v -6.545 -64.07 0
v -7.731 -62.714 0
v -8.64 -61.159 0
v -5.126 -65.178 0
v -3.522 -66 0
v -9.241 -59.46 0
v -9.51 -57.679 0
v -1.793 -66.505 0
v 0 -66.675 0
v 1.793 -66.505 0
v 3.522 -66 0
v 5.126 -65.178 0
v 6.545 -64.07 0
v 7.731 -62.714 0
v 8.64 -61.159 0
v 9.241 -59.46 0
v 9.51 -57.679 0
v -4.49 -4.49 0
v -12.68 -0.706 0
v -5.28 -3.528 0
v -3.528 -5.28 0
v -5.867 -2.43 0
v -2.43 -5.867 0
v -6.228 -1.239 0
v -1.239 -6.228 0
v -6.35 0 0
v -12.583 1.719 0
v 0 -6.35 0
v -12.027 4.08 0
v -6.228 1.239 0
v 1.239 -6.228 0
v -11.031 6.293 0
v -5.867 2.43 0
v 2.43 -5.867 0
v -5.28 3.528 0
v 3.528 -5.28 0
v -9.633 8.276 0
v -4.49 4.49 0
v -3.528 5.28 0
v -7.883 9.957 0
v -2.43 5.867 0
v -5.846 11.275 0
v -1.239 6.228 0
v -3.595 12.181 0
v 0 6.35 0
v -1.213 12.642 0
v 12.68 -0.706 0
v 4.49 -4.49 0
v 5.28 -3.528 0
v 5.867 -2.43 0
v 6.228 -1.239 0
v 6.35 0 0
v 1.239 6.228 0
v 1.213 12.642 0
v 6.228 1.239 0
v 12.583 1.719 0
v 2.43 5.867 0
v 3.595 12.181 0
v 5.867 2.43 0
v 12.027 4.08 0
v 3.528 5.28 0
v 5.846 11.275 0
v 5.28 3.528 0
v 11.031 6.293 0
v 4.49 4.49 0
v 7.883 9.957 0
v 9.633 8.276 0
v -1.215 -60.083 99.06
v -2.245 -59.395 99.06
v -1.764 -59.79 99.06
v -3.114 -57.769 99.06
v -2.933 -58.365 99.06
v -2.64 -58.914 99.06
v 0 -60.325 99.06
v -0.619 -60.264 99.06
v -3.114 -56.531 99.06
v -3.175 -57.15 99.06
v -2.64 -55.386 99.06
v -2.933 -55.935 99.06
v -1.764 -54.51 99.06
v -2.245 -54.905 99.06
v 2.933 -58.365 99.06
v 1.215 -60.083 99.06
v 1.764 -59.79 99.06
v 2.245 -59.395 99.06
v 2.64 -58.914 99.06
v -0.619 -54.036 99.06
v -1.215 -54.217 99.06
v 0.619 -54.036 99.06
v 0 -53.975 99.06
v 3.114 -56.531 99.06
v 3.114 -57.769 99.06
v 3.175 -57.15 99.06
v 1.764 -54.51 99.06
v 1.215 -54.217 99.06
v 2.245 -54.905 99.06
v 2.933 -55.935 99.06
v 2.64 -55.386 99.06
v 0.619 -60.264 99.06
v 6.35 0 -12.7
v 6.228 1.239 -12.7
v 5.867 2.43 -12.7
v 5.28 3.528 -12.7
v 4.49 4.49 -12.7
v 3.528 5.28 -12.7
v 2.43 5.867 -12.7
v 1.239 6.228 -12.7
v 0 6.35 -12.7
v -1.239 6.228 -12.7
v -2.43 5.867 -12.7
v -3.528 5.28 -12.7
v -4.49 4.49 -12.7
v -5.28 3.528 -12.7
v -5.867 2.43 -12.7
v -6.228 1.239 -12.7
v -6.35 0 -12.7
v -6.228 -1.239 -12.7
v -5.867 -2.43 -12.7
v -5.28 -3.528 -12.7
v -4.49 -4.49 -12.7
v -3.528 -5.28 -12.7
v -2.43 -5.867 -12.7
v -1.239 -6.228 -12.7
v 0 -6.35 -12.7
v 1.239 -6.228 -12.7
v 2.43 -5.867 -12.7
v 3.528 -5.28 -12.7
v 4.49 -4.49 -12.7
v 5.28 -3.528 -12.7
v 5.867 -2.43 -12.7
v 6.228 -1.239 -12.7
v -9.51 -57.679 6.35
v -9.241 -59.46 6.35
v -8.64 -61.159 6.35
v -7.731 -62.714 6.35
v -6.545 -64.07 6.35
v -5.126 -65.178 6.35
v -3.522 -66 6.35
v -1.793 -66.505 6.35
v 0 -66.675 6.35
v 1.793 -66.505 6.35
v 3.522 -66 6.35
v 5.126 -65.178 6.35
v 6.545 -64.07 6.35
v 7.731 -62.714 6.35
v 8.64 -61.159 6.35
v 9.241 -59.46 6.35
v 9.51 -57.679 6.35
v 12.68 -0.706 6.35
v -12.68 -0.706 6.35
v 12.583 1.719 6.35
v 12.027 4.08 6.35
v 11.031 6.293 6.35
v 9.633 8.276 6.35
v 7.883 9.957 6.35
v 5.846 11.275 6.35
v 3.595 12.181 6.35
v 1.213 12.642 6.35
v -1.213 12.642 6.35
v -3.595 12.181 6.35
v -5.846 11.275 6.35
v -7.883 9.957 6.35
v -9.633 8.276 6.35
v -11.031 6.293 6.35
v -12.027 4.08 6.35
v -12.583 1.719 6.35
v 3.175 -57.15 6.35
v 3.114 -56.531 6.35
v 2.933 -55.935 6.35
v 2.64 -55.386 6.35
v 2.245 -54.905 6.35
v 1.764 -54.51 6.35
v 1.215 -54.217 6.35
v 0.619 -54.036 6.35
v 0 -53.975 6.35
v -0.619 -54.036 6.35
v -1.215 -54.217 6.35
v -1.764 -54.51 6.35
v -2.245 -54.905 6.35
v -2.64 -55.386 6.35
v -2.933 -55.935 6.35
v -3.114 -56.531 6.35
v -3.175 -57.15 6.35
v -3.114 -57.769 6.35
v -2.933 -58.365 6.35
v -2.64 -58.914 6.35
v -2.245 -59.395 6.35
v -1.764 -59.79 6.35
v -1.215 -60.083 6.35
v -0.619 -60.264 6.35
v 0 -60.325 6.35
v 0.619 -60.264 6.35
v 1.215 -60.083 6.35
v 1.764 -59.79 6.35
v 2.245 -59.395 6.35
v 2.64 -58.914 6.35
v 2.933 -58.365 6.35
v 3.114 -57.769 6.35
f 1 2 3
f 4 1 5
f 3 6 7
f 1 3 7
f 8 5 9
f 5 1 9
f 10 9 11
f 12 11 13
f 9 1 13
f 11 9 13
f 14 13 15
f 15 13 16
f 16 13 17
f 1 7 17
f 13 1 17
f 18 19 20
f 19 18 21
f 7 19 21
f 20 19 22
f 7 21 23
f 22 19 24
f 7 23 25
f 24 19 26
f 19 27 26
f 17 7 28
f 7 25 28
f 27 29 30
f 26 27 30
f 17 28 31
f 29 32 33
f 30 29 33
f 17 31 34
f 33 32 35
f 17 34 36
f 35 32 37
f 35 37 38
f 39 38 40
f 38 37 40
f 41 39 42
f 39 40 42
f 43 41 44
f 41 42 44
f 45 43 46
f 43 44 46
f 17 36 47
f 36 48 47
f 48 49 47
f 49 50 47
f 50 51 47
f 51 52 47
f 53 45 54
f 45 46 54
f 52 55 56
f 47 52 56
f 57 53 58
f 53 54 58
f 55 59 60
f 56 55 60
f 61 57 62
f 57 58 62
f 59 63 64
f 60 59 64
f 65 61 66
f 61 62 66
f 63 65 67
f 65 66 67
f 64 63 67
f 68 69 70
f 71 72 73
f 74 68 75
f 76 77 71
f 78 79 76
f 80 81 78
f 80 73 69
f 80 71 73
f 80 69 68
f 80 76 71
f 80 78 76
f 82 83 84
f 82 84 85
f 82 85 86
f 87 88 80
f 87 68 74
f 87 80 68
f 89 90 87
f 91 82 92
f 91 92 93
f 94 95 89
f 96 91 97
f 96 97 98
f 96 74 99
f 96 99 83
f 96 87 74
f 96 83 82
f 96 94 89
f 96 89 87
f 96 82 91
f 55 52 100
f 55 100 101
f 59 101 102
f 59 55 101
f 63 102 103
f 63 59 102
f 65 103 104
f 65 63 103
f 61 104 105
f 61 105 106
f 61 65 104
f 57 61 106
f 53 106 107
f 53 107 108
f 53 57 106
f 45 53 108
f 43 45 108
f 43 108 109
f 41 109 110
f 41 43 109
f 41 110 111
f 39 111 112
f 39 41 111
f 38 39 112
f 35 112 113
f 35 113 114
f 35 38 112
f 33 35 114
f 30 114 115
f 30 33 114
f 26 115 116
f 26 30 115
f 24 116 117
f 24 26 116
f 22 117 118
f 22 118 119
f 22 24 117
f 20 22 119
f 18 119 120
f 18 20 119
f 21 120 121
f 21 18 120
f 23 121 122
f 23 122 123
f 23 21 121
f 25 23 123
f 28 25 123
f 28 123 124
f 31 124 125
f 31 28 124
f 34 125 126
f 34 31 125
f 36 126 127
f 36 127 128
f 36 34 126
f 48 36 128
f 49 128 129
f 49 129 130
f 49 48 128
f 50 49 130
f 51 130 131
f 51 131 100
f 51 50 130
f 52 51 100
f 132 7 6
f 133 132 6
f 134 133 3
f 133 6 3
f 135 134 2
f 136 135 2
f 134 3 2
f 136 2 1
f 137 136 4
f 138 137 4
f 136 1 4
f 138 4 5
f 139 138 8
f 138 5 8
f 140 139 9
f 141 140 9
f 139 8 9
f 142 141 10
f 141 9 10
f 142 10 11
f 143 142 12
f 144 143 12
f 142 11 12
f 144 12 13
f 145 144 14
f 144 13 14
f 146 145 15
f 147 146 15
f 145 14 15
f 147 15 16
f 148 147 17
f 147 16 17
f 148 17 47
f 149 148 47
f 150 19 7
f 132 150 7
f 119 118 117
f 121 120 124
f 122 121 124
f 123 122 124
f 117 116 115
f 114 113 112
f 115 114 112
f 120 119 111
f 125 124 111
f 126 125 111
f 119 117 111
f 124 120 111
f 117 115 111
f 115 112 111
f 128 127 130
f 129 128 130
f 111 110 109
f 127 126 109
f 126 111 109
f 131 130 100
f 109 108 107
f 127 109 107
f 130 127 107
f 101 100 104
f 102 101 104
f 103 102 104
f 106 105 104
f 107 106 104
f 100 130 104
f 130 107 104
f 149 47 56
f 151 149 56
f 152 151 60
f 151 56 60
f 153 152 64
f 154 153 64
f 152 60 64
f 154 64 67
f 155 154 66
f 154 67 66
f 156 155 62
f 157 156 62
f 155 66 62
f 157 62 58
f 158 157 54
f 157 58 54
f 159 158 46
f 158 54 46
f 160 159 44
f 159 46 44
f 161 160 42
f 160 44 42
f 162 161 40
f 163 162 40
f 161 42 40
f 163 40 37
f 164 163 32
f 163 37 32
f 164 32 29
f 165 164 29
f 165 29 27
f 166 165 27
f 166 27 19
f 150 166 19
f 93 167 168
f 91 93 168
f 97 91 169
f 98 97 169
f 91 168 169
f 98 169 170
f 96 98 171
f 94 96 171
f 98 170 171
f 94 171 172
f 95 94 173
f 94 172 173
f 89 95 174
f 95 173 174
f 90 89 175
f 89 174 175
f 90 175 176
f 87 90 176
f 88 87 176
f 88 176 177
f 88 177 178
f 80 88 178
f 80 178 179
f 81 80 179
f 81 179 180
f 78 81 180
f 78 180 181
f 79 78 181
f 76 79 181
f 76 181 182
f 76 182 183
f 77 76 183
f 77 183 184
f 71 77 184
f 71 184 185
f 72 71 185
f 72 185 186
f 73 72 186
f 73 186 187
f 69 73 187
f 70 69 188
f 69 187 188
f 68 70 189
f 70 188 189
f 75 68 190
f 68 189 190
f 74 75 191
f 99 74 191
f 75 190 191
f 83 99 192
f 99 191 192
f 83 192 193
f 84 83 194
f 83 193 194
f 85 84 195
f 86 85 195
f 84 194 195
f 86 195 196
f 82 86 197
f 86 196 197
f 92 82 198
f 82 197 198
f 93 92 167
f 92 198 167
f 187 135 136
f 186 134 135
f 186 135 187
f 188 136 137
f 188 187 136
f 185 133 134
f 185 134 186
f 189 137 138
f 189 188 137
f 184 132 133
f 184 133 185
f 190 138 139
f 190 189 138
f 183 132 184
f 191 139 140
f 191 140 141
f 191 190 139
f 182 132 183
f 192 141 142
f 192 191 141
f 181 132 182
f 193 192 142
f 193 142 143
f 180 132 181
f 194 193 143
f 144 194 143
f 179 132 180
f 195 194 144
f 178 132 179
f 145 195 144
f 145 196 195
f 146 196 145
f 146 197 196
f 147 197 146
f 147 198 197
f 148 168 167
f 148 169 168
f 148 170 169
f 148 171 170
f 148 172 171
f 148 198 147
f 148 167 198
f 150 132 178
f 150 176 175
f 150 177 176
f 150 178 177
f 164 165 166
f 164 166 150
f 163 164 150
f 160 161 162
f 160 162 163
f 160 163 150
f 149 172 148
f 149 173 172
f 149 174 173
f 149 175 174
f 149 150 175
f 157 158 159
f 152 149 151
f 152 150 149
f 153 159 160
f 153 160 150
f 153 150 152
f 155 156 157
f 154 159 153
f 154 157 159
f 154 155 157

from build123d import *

# Parameters (mm, degrees)
SKETCH1_R           = 6.35
BOSS_EXTRUDE1_DEPTH = 12.7
SKETCH1_3_R         = 3.175
BOSS_EXTRUDE2_DEPTH = 6.35
SKETCH1_4_R         = 3.175
BOSS_EXTRUDE3_DEPTH = 99.06


with BuildPart() as part:
    # Sketch1 → Boss-Extrude1 (new body)
    with BuildSketch(Plane.XY):
        Circle(SKETCH1_R)
    extrude(amount=-BOSS_EXTRUDE1_DEPTH)

    # Sketch1<3> → Boss-Extrude2 (add)
    with BuildSketch(Plane.XY):
        with BuildLine():
            Line((9.510289567, -57.679166667), (12.680386089, -0.705555556))
            ThreePointArc((12.680386089, -0.705555556), (0, 12.7), (-12.680386089, -0.705555556))
            Line((-12.680386089, -0.705555556), (-9.510289567, -57.679166667))
            ThreePointArc((-9.510289567, -57.679166667), (0, -66.675), (9.510289567, -57.679166667))
        make_face()
        with Locations((0, -57.15)):
            Circle(SKETCH1_3_R, mode=Mode.SUBTRACT)
    extrude(amount=BOSS_EXTRUDE2_DEPTH)

    # Sketch1<4> → Boss-Extrude3 (add)
    with BuildSketch(Plane.XY):
        with Locations((0, -57.15)):
            Circle(SKETCH1_4_R)
    extrude(amount=BOSS_EXTRUDE3_DEPTH)


solid = part.part
